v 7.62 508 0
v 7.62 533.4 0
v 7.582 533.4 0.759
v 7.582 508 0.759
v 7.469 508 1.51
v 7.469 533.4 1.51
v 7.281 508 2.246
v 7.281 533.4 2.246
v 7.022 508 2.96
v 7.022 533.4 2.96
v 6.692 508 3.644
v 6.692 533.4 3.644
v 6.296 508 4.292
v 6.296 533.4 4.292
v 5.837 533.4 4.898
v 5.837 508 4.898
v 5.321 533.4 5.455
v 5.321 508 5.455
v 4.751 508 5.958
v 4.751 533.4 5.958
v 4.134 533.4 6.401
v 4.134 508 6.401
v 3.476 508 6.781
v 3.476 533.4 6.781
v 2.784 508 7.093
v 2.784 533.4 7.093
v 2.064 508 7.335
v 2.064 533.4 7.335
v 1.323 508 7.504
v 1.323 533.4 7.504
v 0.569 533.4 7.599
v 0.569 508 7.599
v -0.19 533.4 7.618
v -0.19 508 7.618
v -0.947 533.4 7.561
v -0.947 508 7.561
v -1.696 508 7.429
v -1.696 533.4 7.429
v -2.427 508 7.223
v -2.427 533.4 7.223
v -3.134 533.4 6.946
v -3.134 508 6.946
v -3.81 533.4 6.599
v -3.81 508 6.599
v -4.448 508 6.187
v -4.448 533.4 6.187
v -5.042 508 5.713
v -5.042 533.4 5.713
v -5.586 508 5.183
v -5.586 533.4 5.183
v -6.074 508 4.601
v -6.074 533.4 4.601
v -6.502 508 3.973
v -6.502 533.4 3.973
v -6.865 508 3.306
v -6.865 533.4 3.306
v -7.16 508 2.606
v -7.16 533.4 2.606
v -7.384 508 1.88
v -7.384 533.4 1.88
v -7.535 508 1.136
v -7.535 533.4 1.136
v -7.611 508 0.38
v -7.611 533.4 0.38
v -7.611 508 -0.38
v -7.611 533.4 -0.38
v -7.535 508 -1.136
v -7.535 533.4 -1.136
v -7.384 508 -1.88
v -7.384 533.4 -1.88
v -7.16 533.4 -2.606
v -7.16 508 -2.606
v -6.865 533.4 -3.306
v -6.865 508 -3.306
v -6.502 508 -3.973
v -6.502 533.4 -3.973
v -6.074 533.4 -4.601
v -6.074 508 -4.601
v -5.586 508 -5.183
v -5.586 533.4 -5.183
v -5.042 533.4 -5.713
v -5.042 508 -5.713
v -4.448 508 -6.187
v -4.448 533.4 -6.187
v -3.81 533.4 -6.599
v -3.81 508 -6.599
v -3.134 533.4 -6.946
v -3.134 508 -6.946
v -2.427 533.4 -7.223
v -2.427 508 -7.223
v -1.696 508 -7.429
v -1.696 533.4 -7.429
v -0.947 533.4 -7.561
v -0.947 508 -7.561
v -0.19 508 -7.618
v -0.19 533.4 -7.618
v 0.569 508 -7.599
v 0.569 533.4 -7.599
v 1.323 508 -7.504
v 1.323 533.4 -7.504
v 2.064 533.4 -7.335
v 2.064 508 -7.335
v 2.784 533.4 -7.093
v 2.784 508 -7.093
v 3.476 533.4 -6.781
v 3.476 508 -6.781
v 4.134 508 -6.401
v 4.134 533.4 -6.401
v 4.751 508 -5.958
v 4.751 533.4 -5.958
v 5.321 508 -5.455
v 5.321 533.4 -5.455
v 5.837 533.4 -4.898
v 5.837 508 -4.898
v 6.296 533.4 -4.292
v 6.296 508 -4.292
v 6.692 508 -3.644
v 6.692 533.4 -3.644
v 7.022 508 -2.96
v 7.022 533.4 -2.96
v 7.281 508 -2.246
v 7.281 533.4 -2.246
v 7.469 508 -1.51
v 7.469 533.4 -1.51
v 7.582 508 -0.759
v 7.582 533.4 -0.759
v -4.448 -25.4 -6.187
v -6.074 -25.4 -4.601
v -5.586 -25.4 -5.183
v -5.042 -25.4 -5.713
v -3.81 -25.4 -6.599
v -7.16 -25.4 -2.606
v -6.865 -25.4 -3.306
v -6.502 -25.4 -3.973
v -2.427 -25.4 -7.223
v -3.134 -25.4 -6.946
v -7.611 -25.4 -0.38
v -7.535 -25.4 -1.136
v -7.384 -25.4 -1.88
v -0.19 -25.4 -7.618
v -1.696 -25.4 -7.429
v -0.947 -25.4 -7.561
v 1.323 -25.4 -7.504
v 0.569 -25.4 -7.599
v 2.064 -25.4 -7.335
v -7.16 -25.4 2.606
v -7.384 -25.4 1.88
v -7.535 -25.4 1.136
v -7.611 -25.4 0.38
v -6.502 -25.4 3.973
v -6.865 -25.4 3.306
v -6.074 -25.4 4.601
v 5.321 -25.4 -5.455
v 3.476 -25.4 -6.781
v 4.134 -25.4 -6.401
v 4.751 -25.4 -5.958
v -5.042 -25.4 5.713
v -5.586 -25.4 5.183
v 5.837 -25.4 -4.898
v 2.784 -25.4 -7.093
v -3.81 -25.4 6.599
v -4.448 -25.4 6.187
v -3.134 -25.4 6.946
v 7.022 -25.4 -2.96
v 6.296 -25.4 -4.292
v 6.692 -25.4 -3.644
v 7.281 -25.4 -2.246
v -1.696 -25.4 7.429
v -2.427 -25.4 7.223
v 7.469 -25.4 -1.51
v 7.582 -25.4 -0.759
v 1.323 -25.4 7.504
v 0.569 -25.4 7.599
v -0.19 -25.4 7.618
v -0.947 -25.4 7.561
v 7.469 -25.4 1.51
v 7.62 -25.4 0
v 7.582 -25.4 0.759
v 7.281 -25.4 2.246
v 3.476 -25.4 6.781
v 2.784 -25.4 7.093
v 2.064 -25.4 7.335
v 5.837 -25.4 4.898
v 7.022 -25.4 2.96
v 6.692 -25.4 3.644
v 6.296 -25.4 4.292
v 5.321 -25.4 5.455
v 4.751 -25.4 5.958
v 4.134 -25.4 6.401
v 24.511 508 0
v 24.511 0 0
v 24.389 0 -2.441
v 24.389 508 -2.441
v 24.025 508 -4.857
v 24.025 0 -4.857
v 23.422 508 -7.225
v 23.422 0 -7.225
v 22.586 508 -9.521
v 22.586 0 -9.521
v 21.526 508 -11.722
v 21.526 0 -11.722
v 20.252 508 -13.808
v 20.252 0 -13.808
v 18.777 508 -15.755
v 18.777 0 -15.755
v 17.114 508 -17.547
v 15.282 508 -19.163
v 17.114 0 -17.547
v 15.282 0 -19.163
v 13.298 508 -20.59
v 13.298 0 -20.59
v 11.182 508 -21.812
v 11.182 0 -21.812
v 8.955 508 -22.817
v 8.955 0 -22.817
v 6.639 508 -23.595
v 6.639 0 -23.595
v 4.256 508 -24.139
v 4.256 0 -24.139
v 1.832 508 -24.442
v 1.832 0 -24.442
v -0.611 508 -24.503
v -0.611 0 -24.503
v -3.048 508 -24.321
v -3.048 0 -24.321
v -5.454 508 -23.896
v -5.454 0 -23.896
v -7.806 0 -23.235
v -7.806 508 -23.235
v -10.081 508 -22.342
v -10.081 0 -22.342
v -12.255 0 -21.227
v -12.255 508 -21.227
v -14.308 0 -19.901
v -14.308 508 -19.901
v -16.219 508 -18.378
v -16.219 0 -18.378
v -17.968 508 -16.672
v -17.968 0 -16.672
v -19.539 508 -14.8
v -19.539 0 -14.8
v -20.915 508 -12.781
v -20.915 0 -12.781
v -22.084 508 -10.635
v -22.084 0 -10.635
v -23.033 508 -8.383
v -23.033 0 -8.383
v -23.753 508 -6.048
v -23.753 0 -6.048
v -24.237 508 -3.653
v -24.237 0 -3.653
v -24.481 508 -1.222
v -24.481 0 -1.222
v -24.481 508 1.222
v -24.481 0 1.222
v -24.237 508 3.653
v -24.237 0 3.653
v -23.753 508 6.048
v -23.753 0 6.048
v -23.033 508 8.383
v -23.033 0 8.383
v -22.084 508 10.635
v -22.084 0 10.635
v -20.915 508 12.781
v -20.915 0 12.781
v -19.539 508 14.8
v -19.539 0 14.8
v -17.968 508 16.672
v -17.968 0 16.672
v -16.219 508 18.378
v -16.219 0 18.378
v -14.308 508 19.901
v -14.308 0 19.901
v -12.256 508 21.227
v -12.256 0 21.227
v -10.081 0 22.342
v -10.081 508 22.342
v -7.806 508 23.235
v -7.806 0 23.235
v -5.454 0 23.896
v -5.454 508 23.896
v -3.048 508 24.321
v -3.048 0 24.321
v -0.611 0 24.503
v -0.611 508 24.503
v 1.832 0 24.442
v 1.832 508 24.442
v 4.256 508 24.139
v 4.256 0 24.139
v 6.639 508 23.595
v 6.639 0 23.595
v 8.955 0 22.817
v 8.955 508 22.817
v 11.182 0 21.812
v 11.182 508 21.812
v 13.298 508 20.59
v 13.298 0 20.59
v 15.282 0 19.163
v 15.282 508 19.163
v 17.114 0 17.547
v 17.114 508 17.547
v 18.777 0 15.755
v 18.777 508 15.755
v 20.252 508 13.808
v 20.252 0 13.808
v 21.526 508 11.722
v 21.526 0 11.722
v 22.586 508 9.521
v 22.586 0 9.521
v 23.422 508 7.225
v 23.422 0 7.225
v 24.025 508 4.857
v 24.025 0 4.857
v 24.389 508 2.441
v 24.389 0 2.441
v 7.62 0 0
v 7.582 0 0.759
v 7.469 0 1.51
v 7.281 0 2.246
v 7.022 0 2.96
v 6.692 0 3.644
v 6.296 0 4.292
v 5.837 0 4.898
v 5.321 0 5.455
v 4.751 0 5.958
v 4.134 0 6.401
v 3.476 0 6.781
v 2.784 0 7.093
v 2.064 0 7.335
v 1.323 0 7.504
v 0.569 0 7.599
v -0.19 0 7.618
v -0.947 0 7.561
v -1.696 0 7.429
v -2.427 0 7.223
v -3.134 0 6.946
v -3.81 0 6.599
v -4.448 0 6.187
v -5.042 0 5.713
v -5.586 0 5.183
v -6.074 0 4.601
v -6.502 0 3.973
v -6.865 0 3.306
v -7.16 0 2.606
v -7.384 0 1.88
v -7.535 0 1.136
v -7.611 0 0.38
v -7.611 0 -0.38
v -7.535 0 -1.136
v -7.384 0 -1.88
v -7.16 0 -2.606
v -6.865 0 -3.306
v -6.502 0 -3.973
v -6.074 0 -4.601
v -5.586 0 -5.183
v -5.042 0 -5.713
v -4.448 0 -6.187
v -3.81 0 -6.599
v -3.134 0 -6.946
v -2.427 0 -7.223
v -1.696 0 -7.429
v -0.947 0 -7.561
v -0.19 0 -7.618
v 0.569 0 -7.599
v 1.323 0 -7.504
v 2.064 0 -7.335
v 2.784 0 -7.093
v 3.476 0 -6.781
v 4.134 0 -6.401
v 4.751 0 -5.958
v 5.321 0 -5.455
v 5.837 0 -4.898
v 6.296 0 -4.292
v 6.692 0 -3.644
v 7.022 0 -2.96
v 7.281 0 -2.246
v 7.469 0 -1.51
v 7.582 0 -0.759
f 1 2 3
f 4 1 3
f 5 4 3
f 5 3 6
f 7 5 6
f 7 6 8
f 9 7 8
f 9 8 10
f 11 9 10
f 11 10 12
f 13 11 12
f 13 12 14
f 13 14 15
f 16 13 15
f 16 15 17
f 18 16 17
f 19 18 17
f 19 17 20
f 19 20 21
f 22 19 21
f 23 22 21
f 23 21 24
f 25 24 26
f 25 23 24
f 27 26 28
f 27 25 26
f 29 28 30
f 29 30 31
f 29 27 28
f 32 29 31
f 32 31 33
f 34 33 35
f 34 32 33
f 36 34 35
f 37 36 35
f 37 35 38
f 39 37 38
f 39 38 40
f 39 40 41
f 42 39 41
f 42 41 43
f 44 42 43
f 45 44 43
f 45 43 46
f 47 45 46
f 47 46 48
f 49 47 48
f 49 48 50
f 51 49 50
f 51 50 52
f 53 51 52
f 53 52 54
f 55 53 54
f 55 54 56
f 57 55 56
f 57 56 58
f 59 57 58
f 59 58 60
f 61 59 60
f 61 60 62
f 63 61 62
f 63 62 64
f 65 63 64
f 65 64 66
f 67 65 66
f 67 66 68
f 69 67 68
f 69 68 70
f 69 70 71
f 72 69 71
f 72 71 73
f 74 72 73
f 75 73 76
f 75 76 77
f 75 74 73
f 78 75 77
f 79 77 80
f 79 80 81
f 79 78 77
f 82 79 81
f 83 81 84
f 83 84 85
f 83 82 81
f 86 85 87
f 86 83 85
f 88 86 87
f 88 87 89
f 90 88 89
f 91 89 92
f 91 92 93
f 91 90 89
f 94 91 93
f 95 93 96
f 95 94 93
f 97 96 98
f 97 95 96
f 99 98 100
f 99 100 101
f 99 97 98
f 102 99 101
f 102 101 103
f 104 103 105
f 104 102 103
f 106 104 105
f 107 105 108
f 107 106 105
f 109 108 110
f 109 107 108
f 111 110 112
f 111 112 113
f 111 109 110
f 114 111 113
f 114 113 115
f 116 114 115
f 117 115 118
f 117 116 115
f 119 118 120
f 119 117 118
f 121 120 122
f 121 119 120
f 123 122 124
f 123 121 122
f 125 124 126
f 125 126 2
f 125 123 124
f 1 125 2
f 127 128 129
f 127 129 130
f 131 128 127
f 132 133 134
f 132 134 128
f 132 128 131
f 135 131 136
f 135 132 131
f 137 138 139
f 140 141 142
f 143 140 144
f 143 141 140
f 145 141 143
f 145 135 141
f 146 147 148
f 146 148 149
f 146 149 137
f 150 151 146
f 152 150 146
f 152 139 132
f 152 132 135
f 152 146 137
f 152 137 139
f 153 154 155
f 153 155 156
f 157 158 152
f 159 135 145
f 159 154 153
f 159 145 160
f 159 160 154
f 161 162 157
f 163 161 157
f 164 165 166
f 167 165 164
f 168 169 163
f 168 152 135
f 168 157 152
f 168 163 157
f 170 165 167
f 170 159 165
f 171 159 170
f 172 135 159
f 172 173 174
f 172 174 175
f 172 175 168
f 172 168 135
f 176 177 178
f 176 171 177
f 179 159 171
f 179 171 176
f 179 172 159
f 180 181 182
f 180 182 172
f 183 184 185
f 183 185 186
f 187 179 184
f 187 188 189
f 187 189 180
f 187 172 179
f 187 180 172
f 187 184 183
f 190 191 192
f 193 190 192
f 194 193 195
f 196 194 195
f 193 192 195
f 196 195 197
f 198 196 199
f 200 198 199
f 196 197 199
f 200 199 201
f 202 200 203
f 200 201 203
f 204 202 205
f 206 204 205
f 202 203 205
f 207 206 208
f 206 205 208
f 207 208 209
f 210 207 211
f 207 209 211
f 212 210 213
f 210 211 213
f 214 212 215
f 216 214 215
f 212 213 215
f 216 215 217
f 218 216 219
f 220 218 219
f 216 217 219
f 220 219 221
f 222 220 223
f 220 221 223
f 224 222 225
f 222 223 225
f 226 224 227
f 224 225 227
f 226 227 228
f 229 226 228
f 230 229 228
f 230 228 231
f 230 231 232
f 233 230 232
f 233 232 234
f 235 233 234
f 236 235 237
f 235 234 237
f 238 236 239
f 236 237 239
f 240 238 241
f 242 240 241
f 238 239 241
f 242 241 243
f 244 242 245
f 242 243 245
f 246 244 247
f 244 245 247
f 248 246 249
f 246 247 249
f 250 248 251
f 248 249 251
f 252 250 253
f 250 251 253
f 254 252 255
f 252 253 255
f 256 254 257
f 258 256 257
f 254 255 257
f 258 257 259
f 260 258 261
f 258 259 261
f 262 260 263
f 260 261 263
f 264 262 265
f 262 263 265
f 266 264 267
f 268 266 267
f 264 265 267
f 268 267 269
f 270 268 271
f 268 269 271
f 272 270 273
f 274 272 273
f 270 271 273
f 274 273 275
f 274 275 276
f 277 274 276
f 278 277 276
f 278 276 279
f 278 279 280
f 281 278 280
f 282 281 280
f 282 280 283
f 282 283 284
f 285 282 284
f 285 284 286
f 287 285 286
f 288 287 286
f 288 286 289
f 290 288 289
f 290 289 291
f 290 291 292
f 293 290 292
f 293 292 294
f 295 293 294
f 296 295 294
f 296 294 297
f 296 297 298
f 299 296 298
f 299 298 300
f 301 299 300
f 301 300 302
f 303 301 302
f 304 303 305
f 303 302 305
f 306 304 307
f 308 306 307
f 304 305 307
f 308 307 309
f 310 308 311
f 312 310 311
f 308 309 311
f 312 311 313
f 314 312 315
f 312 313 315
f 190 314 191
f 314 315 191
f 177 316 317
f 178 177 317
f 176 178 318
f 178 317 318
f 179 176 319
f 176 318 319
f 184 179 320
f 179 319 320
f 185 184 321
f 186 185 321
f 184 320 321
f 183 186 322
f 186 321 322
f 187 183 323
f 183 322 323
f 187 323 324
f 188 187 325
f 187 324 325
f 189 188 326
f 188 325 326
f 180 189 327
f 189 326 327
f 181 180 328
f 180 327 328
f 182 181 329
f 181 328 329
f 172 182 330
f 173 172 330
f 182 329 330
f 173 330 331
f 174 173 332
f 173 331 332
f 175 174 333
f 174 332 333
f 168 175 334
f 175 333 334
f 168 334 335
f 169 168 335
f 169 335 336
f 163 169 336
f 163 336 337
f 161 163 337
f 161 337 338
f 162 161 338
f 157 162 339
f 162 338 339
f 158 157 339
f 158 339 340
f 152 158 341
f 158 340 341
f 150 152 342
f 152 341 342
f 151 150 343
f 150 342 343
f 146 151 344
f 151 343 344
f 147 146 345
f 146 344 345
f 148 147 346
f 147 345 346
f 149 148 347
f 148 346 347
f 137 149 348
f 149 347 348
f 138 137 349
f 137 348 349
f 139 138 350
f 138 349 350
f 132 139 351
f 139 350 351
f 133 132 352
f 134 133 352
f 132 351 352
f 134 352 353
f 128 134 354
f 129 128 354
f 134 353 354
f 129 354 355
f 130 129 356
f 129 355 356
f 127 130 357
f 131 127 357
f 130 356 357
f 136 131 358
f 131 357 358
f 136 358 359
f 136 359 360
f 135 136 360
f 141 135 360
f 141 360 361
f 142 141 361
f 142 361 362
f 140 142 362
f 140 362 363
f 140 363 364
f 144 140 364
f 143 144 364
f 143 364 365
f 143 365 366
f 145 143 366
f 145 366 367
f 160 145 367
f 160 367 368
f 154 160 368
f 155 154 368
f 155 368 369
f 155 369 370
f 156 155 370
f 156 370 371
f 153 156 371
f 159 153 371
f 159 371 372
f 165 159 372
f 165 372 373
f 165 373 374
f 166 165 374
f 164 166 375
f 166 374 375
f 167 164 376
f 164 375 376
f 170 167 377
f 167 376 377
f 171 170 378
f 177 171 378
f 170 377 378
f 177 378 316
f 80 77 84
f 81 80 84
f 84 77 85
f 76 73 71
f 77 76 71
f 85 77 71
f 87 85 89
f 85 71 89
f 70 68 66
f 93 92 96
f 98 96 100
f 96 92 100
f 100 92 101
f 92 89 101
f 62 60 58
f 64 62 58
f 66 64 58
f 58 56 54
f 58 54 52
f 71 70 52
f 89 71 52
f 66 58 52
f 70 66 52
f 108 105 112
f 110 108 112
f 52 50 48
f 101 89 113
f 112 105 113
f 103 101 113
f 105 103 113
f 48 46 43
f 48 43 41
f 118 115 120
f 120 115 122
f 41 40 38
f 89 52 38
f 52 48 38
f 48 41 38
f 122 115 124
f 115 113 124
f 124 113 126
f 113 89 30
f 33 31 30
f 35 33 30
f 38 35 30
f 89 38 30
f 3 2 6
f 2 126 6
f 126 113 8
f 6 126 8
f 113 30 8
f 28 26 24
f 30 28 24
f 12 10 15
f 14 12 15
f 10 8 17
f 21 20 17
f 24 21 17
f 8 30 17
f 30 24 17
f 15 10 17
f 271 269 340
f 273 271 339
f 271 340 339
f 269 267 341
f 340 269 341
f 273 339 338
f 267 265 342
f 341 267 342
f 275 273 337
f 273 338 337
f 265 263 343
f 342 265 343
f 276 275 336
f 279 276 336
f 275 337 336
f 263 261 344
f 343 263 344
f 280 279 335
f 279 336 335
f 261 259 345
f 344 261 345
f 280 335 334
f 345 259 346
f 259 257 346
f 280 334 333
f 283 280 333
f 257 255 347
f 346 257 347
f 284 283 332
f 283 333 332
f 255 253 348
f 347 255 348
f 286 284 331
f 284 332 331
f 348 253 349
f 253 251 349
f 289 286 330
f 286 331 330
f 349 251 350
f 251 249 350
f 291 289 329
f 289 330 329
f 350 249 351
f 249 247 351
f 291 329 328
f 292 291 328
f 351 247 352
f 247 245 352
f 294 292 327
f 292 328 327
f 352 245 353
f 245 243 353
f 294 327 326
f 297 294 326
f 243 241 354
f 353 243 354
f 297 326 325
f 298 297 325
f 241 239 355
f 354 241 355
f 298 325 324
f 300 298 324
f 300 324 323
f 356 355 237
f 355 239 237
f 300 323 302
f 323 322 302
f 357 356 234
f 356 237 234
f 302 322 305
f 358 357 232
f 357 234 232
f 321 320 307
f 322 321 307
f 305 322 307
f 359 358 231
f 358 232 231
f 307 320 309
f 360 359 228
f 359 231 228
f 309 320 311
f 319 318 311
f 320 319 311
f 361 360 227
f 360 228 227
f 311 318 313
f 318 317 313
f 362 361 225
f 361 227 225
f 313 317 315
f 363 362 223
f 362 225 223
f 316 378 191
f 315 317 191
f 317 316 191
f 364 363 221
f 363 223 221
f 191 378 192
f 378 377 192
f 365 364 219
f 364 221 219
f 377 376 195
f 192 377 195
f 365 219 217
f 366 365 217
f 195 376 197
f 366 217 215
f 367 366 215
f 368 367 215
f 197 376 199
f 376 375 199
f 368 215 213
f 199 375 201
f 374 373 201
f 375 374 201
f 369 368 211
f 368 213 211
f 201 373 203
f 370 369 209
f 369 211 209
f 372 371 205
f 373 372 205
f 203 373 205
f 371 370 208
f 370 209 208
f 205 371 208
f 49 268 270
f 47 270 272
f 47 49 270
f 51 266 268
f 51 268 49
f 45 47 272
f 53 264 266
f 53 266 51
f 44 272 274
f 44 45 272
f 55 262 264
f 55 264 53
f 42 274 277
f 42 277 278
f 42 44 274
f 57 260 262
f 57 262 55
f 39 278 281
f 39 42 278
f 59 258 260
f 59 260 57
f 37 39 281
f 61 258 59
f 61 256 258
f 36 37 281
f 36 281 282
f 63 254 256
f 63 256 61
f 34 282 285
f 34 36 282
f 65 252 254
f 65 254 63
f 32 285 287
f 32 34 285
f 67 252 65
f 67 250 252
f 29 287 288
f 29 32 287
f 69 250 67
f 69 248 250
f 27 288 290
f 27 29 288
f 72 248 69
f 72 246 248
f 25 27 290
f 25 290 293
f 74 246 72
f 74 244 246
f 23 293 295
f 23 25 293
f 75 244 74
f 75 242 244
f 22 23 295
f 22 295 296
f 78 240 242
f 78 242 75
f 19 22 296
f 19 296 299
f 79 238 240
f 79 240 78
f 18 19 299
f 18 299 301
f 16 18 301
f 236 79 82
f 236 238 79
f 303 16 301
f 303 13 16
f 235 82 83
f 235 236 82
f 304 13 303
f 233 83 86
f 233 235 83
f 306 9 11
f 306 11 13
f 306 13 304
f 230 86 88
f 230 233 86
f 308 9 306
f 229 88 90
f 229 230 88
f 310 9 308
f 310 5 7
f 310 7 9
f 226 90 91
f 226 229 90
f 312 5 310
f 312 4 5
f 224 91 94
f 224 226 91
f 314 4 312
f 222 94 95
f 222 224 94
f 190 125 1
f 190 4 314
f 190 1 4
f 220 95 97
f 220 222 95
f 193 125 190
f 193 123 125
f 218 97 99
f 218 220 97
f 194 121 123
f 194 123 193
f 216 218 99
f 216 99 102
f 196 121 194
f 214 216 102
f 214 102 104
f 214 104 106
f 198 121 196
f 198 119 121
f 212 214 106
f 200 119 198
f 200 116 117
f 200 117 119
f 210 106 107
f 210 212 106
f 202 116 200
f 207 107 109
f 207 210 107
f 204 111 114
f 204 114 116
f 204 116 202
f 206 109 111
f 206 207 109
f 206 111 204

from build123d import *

# Parameters (mm, degrees)
SKETCH1_R                = 24.511
BOSS_EXTRUDE1_DEPTH      = 508
SKETCH2_R                = 7.62
BOSS_EXTRUDE2_DEPTH      = 25.4
BOSS_EXTRUDE2_DEPTH_BACK = 533.4


with BuildPart() as part:
    # Sketch1 → Boss-Extrude1 (new body)
    with BuildSketch(Plane(origin=(0, 0, 0), x_dir=(1, 0, 0), z_dir=(0, 1, 0))):
        Circle(SKETCH1_R)
    extrude(amount=BOSS_EXTRUDE1_DEPTH)

    # Sketch2 → Boss-Extrude2 (add, two sides)
    with BuildSketch(Plane.XZ) as boss_extrude2_sk:
        Circle(SKETCH2_R)
    extrude(amount=BOSS_EXTRUDE2_DEPTH)
    extrude(boss_extrude2_sk.sketch, amount=-BOSS_EXTRUDE2_DEPTH_BACK)


solid = part.part
